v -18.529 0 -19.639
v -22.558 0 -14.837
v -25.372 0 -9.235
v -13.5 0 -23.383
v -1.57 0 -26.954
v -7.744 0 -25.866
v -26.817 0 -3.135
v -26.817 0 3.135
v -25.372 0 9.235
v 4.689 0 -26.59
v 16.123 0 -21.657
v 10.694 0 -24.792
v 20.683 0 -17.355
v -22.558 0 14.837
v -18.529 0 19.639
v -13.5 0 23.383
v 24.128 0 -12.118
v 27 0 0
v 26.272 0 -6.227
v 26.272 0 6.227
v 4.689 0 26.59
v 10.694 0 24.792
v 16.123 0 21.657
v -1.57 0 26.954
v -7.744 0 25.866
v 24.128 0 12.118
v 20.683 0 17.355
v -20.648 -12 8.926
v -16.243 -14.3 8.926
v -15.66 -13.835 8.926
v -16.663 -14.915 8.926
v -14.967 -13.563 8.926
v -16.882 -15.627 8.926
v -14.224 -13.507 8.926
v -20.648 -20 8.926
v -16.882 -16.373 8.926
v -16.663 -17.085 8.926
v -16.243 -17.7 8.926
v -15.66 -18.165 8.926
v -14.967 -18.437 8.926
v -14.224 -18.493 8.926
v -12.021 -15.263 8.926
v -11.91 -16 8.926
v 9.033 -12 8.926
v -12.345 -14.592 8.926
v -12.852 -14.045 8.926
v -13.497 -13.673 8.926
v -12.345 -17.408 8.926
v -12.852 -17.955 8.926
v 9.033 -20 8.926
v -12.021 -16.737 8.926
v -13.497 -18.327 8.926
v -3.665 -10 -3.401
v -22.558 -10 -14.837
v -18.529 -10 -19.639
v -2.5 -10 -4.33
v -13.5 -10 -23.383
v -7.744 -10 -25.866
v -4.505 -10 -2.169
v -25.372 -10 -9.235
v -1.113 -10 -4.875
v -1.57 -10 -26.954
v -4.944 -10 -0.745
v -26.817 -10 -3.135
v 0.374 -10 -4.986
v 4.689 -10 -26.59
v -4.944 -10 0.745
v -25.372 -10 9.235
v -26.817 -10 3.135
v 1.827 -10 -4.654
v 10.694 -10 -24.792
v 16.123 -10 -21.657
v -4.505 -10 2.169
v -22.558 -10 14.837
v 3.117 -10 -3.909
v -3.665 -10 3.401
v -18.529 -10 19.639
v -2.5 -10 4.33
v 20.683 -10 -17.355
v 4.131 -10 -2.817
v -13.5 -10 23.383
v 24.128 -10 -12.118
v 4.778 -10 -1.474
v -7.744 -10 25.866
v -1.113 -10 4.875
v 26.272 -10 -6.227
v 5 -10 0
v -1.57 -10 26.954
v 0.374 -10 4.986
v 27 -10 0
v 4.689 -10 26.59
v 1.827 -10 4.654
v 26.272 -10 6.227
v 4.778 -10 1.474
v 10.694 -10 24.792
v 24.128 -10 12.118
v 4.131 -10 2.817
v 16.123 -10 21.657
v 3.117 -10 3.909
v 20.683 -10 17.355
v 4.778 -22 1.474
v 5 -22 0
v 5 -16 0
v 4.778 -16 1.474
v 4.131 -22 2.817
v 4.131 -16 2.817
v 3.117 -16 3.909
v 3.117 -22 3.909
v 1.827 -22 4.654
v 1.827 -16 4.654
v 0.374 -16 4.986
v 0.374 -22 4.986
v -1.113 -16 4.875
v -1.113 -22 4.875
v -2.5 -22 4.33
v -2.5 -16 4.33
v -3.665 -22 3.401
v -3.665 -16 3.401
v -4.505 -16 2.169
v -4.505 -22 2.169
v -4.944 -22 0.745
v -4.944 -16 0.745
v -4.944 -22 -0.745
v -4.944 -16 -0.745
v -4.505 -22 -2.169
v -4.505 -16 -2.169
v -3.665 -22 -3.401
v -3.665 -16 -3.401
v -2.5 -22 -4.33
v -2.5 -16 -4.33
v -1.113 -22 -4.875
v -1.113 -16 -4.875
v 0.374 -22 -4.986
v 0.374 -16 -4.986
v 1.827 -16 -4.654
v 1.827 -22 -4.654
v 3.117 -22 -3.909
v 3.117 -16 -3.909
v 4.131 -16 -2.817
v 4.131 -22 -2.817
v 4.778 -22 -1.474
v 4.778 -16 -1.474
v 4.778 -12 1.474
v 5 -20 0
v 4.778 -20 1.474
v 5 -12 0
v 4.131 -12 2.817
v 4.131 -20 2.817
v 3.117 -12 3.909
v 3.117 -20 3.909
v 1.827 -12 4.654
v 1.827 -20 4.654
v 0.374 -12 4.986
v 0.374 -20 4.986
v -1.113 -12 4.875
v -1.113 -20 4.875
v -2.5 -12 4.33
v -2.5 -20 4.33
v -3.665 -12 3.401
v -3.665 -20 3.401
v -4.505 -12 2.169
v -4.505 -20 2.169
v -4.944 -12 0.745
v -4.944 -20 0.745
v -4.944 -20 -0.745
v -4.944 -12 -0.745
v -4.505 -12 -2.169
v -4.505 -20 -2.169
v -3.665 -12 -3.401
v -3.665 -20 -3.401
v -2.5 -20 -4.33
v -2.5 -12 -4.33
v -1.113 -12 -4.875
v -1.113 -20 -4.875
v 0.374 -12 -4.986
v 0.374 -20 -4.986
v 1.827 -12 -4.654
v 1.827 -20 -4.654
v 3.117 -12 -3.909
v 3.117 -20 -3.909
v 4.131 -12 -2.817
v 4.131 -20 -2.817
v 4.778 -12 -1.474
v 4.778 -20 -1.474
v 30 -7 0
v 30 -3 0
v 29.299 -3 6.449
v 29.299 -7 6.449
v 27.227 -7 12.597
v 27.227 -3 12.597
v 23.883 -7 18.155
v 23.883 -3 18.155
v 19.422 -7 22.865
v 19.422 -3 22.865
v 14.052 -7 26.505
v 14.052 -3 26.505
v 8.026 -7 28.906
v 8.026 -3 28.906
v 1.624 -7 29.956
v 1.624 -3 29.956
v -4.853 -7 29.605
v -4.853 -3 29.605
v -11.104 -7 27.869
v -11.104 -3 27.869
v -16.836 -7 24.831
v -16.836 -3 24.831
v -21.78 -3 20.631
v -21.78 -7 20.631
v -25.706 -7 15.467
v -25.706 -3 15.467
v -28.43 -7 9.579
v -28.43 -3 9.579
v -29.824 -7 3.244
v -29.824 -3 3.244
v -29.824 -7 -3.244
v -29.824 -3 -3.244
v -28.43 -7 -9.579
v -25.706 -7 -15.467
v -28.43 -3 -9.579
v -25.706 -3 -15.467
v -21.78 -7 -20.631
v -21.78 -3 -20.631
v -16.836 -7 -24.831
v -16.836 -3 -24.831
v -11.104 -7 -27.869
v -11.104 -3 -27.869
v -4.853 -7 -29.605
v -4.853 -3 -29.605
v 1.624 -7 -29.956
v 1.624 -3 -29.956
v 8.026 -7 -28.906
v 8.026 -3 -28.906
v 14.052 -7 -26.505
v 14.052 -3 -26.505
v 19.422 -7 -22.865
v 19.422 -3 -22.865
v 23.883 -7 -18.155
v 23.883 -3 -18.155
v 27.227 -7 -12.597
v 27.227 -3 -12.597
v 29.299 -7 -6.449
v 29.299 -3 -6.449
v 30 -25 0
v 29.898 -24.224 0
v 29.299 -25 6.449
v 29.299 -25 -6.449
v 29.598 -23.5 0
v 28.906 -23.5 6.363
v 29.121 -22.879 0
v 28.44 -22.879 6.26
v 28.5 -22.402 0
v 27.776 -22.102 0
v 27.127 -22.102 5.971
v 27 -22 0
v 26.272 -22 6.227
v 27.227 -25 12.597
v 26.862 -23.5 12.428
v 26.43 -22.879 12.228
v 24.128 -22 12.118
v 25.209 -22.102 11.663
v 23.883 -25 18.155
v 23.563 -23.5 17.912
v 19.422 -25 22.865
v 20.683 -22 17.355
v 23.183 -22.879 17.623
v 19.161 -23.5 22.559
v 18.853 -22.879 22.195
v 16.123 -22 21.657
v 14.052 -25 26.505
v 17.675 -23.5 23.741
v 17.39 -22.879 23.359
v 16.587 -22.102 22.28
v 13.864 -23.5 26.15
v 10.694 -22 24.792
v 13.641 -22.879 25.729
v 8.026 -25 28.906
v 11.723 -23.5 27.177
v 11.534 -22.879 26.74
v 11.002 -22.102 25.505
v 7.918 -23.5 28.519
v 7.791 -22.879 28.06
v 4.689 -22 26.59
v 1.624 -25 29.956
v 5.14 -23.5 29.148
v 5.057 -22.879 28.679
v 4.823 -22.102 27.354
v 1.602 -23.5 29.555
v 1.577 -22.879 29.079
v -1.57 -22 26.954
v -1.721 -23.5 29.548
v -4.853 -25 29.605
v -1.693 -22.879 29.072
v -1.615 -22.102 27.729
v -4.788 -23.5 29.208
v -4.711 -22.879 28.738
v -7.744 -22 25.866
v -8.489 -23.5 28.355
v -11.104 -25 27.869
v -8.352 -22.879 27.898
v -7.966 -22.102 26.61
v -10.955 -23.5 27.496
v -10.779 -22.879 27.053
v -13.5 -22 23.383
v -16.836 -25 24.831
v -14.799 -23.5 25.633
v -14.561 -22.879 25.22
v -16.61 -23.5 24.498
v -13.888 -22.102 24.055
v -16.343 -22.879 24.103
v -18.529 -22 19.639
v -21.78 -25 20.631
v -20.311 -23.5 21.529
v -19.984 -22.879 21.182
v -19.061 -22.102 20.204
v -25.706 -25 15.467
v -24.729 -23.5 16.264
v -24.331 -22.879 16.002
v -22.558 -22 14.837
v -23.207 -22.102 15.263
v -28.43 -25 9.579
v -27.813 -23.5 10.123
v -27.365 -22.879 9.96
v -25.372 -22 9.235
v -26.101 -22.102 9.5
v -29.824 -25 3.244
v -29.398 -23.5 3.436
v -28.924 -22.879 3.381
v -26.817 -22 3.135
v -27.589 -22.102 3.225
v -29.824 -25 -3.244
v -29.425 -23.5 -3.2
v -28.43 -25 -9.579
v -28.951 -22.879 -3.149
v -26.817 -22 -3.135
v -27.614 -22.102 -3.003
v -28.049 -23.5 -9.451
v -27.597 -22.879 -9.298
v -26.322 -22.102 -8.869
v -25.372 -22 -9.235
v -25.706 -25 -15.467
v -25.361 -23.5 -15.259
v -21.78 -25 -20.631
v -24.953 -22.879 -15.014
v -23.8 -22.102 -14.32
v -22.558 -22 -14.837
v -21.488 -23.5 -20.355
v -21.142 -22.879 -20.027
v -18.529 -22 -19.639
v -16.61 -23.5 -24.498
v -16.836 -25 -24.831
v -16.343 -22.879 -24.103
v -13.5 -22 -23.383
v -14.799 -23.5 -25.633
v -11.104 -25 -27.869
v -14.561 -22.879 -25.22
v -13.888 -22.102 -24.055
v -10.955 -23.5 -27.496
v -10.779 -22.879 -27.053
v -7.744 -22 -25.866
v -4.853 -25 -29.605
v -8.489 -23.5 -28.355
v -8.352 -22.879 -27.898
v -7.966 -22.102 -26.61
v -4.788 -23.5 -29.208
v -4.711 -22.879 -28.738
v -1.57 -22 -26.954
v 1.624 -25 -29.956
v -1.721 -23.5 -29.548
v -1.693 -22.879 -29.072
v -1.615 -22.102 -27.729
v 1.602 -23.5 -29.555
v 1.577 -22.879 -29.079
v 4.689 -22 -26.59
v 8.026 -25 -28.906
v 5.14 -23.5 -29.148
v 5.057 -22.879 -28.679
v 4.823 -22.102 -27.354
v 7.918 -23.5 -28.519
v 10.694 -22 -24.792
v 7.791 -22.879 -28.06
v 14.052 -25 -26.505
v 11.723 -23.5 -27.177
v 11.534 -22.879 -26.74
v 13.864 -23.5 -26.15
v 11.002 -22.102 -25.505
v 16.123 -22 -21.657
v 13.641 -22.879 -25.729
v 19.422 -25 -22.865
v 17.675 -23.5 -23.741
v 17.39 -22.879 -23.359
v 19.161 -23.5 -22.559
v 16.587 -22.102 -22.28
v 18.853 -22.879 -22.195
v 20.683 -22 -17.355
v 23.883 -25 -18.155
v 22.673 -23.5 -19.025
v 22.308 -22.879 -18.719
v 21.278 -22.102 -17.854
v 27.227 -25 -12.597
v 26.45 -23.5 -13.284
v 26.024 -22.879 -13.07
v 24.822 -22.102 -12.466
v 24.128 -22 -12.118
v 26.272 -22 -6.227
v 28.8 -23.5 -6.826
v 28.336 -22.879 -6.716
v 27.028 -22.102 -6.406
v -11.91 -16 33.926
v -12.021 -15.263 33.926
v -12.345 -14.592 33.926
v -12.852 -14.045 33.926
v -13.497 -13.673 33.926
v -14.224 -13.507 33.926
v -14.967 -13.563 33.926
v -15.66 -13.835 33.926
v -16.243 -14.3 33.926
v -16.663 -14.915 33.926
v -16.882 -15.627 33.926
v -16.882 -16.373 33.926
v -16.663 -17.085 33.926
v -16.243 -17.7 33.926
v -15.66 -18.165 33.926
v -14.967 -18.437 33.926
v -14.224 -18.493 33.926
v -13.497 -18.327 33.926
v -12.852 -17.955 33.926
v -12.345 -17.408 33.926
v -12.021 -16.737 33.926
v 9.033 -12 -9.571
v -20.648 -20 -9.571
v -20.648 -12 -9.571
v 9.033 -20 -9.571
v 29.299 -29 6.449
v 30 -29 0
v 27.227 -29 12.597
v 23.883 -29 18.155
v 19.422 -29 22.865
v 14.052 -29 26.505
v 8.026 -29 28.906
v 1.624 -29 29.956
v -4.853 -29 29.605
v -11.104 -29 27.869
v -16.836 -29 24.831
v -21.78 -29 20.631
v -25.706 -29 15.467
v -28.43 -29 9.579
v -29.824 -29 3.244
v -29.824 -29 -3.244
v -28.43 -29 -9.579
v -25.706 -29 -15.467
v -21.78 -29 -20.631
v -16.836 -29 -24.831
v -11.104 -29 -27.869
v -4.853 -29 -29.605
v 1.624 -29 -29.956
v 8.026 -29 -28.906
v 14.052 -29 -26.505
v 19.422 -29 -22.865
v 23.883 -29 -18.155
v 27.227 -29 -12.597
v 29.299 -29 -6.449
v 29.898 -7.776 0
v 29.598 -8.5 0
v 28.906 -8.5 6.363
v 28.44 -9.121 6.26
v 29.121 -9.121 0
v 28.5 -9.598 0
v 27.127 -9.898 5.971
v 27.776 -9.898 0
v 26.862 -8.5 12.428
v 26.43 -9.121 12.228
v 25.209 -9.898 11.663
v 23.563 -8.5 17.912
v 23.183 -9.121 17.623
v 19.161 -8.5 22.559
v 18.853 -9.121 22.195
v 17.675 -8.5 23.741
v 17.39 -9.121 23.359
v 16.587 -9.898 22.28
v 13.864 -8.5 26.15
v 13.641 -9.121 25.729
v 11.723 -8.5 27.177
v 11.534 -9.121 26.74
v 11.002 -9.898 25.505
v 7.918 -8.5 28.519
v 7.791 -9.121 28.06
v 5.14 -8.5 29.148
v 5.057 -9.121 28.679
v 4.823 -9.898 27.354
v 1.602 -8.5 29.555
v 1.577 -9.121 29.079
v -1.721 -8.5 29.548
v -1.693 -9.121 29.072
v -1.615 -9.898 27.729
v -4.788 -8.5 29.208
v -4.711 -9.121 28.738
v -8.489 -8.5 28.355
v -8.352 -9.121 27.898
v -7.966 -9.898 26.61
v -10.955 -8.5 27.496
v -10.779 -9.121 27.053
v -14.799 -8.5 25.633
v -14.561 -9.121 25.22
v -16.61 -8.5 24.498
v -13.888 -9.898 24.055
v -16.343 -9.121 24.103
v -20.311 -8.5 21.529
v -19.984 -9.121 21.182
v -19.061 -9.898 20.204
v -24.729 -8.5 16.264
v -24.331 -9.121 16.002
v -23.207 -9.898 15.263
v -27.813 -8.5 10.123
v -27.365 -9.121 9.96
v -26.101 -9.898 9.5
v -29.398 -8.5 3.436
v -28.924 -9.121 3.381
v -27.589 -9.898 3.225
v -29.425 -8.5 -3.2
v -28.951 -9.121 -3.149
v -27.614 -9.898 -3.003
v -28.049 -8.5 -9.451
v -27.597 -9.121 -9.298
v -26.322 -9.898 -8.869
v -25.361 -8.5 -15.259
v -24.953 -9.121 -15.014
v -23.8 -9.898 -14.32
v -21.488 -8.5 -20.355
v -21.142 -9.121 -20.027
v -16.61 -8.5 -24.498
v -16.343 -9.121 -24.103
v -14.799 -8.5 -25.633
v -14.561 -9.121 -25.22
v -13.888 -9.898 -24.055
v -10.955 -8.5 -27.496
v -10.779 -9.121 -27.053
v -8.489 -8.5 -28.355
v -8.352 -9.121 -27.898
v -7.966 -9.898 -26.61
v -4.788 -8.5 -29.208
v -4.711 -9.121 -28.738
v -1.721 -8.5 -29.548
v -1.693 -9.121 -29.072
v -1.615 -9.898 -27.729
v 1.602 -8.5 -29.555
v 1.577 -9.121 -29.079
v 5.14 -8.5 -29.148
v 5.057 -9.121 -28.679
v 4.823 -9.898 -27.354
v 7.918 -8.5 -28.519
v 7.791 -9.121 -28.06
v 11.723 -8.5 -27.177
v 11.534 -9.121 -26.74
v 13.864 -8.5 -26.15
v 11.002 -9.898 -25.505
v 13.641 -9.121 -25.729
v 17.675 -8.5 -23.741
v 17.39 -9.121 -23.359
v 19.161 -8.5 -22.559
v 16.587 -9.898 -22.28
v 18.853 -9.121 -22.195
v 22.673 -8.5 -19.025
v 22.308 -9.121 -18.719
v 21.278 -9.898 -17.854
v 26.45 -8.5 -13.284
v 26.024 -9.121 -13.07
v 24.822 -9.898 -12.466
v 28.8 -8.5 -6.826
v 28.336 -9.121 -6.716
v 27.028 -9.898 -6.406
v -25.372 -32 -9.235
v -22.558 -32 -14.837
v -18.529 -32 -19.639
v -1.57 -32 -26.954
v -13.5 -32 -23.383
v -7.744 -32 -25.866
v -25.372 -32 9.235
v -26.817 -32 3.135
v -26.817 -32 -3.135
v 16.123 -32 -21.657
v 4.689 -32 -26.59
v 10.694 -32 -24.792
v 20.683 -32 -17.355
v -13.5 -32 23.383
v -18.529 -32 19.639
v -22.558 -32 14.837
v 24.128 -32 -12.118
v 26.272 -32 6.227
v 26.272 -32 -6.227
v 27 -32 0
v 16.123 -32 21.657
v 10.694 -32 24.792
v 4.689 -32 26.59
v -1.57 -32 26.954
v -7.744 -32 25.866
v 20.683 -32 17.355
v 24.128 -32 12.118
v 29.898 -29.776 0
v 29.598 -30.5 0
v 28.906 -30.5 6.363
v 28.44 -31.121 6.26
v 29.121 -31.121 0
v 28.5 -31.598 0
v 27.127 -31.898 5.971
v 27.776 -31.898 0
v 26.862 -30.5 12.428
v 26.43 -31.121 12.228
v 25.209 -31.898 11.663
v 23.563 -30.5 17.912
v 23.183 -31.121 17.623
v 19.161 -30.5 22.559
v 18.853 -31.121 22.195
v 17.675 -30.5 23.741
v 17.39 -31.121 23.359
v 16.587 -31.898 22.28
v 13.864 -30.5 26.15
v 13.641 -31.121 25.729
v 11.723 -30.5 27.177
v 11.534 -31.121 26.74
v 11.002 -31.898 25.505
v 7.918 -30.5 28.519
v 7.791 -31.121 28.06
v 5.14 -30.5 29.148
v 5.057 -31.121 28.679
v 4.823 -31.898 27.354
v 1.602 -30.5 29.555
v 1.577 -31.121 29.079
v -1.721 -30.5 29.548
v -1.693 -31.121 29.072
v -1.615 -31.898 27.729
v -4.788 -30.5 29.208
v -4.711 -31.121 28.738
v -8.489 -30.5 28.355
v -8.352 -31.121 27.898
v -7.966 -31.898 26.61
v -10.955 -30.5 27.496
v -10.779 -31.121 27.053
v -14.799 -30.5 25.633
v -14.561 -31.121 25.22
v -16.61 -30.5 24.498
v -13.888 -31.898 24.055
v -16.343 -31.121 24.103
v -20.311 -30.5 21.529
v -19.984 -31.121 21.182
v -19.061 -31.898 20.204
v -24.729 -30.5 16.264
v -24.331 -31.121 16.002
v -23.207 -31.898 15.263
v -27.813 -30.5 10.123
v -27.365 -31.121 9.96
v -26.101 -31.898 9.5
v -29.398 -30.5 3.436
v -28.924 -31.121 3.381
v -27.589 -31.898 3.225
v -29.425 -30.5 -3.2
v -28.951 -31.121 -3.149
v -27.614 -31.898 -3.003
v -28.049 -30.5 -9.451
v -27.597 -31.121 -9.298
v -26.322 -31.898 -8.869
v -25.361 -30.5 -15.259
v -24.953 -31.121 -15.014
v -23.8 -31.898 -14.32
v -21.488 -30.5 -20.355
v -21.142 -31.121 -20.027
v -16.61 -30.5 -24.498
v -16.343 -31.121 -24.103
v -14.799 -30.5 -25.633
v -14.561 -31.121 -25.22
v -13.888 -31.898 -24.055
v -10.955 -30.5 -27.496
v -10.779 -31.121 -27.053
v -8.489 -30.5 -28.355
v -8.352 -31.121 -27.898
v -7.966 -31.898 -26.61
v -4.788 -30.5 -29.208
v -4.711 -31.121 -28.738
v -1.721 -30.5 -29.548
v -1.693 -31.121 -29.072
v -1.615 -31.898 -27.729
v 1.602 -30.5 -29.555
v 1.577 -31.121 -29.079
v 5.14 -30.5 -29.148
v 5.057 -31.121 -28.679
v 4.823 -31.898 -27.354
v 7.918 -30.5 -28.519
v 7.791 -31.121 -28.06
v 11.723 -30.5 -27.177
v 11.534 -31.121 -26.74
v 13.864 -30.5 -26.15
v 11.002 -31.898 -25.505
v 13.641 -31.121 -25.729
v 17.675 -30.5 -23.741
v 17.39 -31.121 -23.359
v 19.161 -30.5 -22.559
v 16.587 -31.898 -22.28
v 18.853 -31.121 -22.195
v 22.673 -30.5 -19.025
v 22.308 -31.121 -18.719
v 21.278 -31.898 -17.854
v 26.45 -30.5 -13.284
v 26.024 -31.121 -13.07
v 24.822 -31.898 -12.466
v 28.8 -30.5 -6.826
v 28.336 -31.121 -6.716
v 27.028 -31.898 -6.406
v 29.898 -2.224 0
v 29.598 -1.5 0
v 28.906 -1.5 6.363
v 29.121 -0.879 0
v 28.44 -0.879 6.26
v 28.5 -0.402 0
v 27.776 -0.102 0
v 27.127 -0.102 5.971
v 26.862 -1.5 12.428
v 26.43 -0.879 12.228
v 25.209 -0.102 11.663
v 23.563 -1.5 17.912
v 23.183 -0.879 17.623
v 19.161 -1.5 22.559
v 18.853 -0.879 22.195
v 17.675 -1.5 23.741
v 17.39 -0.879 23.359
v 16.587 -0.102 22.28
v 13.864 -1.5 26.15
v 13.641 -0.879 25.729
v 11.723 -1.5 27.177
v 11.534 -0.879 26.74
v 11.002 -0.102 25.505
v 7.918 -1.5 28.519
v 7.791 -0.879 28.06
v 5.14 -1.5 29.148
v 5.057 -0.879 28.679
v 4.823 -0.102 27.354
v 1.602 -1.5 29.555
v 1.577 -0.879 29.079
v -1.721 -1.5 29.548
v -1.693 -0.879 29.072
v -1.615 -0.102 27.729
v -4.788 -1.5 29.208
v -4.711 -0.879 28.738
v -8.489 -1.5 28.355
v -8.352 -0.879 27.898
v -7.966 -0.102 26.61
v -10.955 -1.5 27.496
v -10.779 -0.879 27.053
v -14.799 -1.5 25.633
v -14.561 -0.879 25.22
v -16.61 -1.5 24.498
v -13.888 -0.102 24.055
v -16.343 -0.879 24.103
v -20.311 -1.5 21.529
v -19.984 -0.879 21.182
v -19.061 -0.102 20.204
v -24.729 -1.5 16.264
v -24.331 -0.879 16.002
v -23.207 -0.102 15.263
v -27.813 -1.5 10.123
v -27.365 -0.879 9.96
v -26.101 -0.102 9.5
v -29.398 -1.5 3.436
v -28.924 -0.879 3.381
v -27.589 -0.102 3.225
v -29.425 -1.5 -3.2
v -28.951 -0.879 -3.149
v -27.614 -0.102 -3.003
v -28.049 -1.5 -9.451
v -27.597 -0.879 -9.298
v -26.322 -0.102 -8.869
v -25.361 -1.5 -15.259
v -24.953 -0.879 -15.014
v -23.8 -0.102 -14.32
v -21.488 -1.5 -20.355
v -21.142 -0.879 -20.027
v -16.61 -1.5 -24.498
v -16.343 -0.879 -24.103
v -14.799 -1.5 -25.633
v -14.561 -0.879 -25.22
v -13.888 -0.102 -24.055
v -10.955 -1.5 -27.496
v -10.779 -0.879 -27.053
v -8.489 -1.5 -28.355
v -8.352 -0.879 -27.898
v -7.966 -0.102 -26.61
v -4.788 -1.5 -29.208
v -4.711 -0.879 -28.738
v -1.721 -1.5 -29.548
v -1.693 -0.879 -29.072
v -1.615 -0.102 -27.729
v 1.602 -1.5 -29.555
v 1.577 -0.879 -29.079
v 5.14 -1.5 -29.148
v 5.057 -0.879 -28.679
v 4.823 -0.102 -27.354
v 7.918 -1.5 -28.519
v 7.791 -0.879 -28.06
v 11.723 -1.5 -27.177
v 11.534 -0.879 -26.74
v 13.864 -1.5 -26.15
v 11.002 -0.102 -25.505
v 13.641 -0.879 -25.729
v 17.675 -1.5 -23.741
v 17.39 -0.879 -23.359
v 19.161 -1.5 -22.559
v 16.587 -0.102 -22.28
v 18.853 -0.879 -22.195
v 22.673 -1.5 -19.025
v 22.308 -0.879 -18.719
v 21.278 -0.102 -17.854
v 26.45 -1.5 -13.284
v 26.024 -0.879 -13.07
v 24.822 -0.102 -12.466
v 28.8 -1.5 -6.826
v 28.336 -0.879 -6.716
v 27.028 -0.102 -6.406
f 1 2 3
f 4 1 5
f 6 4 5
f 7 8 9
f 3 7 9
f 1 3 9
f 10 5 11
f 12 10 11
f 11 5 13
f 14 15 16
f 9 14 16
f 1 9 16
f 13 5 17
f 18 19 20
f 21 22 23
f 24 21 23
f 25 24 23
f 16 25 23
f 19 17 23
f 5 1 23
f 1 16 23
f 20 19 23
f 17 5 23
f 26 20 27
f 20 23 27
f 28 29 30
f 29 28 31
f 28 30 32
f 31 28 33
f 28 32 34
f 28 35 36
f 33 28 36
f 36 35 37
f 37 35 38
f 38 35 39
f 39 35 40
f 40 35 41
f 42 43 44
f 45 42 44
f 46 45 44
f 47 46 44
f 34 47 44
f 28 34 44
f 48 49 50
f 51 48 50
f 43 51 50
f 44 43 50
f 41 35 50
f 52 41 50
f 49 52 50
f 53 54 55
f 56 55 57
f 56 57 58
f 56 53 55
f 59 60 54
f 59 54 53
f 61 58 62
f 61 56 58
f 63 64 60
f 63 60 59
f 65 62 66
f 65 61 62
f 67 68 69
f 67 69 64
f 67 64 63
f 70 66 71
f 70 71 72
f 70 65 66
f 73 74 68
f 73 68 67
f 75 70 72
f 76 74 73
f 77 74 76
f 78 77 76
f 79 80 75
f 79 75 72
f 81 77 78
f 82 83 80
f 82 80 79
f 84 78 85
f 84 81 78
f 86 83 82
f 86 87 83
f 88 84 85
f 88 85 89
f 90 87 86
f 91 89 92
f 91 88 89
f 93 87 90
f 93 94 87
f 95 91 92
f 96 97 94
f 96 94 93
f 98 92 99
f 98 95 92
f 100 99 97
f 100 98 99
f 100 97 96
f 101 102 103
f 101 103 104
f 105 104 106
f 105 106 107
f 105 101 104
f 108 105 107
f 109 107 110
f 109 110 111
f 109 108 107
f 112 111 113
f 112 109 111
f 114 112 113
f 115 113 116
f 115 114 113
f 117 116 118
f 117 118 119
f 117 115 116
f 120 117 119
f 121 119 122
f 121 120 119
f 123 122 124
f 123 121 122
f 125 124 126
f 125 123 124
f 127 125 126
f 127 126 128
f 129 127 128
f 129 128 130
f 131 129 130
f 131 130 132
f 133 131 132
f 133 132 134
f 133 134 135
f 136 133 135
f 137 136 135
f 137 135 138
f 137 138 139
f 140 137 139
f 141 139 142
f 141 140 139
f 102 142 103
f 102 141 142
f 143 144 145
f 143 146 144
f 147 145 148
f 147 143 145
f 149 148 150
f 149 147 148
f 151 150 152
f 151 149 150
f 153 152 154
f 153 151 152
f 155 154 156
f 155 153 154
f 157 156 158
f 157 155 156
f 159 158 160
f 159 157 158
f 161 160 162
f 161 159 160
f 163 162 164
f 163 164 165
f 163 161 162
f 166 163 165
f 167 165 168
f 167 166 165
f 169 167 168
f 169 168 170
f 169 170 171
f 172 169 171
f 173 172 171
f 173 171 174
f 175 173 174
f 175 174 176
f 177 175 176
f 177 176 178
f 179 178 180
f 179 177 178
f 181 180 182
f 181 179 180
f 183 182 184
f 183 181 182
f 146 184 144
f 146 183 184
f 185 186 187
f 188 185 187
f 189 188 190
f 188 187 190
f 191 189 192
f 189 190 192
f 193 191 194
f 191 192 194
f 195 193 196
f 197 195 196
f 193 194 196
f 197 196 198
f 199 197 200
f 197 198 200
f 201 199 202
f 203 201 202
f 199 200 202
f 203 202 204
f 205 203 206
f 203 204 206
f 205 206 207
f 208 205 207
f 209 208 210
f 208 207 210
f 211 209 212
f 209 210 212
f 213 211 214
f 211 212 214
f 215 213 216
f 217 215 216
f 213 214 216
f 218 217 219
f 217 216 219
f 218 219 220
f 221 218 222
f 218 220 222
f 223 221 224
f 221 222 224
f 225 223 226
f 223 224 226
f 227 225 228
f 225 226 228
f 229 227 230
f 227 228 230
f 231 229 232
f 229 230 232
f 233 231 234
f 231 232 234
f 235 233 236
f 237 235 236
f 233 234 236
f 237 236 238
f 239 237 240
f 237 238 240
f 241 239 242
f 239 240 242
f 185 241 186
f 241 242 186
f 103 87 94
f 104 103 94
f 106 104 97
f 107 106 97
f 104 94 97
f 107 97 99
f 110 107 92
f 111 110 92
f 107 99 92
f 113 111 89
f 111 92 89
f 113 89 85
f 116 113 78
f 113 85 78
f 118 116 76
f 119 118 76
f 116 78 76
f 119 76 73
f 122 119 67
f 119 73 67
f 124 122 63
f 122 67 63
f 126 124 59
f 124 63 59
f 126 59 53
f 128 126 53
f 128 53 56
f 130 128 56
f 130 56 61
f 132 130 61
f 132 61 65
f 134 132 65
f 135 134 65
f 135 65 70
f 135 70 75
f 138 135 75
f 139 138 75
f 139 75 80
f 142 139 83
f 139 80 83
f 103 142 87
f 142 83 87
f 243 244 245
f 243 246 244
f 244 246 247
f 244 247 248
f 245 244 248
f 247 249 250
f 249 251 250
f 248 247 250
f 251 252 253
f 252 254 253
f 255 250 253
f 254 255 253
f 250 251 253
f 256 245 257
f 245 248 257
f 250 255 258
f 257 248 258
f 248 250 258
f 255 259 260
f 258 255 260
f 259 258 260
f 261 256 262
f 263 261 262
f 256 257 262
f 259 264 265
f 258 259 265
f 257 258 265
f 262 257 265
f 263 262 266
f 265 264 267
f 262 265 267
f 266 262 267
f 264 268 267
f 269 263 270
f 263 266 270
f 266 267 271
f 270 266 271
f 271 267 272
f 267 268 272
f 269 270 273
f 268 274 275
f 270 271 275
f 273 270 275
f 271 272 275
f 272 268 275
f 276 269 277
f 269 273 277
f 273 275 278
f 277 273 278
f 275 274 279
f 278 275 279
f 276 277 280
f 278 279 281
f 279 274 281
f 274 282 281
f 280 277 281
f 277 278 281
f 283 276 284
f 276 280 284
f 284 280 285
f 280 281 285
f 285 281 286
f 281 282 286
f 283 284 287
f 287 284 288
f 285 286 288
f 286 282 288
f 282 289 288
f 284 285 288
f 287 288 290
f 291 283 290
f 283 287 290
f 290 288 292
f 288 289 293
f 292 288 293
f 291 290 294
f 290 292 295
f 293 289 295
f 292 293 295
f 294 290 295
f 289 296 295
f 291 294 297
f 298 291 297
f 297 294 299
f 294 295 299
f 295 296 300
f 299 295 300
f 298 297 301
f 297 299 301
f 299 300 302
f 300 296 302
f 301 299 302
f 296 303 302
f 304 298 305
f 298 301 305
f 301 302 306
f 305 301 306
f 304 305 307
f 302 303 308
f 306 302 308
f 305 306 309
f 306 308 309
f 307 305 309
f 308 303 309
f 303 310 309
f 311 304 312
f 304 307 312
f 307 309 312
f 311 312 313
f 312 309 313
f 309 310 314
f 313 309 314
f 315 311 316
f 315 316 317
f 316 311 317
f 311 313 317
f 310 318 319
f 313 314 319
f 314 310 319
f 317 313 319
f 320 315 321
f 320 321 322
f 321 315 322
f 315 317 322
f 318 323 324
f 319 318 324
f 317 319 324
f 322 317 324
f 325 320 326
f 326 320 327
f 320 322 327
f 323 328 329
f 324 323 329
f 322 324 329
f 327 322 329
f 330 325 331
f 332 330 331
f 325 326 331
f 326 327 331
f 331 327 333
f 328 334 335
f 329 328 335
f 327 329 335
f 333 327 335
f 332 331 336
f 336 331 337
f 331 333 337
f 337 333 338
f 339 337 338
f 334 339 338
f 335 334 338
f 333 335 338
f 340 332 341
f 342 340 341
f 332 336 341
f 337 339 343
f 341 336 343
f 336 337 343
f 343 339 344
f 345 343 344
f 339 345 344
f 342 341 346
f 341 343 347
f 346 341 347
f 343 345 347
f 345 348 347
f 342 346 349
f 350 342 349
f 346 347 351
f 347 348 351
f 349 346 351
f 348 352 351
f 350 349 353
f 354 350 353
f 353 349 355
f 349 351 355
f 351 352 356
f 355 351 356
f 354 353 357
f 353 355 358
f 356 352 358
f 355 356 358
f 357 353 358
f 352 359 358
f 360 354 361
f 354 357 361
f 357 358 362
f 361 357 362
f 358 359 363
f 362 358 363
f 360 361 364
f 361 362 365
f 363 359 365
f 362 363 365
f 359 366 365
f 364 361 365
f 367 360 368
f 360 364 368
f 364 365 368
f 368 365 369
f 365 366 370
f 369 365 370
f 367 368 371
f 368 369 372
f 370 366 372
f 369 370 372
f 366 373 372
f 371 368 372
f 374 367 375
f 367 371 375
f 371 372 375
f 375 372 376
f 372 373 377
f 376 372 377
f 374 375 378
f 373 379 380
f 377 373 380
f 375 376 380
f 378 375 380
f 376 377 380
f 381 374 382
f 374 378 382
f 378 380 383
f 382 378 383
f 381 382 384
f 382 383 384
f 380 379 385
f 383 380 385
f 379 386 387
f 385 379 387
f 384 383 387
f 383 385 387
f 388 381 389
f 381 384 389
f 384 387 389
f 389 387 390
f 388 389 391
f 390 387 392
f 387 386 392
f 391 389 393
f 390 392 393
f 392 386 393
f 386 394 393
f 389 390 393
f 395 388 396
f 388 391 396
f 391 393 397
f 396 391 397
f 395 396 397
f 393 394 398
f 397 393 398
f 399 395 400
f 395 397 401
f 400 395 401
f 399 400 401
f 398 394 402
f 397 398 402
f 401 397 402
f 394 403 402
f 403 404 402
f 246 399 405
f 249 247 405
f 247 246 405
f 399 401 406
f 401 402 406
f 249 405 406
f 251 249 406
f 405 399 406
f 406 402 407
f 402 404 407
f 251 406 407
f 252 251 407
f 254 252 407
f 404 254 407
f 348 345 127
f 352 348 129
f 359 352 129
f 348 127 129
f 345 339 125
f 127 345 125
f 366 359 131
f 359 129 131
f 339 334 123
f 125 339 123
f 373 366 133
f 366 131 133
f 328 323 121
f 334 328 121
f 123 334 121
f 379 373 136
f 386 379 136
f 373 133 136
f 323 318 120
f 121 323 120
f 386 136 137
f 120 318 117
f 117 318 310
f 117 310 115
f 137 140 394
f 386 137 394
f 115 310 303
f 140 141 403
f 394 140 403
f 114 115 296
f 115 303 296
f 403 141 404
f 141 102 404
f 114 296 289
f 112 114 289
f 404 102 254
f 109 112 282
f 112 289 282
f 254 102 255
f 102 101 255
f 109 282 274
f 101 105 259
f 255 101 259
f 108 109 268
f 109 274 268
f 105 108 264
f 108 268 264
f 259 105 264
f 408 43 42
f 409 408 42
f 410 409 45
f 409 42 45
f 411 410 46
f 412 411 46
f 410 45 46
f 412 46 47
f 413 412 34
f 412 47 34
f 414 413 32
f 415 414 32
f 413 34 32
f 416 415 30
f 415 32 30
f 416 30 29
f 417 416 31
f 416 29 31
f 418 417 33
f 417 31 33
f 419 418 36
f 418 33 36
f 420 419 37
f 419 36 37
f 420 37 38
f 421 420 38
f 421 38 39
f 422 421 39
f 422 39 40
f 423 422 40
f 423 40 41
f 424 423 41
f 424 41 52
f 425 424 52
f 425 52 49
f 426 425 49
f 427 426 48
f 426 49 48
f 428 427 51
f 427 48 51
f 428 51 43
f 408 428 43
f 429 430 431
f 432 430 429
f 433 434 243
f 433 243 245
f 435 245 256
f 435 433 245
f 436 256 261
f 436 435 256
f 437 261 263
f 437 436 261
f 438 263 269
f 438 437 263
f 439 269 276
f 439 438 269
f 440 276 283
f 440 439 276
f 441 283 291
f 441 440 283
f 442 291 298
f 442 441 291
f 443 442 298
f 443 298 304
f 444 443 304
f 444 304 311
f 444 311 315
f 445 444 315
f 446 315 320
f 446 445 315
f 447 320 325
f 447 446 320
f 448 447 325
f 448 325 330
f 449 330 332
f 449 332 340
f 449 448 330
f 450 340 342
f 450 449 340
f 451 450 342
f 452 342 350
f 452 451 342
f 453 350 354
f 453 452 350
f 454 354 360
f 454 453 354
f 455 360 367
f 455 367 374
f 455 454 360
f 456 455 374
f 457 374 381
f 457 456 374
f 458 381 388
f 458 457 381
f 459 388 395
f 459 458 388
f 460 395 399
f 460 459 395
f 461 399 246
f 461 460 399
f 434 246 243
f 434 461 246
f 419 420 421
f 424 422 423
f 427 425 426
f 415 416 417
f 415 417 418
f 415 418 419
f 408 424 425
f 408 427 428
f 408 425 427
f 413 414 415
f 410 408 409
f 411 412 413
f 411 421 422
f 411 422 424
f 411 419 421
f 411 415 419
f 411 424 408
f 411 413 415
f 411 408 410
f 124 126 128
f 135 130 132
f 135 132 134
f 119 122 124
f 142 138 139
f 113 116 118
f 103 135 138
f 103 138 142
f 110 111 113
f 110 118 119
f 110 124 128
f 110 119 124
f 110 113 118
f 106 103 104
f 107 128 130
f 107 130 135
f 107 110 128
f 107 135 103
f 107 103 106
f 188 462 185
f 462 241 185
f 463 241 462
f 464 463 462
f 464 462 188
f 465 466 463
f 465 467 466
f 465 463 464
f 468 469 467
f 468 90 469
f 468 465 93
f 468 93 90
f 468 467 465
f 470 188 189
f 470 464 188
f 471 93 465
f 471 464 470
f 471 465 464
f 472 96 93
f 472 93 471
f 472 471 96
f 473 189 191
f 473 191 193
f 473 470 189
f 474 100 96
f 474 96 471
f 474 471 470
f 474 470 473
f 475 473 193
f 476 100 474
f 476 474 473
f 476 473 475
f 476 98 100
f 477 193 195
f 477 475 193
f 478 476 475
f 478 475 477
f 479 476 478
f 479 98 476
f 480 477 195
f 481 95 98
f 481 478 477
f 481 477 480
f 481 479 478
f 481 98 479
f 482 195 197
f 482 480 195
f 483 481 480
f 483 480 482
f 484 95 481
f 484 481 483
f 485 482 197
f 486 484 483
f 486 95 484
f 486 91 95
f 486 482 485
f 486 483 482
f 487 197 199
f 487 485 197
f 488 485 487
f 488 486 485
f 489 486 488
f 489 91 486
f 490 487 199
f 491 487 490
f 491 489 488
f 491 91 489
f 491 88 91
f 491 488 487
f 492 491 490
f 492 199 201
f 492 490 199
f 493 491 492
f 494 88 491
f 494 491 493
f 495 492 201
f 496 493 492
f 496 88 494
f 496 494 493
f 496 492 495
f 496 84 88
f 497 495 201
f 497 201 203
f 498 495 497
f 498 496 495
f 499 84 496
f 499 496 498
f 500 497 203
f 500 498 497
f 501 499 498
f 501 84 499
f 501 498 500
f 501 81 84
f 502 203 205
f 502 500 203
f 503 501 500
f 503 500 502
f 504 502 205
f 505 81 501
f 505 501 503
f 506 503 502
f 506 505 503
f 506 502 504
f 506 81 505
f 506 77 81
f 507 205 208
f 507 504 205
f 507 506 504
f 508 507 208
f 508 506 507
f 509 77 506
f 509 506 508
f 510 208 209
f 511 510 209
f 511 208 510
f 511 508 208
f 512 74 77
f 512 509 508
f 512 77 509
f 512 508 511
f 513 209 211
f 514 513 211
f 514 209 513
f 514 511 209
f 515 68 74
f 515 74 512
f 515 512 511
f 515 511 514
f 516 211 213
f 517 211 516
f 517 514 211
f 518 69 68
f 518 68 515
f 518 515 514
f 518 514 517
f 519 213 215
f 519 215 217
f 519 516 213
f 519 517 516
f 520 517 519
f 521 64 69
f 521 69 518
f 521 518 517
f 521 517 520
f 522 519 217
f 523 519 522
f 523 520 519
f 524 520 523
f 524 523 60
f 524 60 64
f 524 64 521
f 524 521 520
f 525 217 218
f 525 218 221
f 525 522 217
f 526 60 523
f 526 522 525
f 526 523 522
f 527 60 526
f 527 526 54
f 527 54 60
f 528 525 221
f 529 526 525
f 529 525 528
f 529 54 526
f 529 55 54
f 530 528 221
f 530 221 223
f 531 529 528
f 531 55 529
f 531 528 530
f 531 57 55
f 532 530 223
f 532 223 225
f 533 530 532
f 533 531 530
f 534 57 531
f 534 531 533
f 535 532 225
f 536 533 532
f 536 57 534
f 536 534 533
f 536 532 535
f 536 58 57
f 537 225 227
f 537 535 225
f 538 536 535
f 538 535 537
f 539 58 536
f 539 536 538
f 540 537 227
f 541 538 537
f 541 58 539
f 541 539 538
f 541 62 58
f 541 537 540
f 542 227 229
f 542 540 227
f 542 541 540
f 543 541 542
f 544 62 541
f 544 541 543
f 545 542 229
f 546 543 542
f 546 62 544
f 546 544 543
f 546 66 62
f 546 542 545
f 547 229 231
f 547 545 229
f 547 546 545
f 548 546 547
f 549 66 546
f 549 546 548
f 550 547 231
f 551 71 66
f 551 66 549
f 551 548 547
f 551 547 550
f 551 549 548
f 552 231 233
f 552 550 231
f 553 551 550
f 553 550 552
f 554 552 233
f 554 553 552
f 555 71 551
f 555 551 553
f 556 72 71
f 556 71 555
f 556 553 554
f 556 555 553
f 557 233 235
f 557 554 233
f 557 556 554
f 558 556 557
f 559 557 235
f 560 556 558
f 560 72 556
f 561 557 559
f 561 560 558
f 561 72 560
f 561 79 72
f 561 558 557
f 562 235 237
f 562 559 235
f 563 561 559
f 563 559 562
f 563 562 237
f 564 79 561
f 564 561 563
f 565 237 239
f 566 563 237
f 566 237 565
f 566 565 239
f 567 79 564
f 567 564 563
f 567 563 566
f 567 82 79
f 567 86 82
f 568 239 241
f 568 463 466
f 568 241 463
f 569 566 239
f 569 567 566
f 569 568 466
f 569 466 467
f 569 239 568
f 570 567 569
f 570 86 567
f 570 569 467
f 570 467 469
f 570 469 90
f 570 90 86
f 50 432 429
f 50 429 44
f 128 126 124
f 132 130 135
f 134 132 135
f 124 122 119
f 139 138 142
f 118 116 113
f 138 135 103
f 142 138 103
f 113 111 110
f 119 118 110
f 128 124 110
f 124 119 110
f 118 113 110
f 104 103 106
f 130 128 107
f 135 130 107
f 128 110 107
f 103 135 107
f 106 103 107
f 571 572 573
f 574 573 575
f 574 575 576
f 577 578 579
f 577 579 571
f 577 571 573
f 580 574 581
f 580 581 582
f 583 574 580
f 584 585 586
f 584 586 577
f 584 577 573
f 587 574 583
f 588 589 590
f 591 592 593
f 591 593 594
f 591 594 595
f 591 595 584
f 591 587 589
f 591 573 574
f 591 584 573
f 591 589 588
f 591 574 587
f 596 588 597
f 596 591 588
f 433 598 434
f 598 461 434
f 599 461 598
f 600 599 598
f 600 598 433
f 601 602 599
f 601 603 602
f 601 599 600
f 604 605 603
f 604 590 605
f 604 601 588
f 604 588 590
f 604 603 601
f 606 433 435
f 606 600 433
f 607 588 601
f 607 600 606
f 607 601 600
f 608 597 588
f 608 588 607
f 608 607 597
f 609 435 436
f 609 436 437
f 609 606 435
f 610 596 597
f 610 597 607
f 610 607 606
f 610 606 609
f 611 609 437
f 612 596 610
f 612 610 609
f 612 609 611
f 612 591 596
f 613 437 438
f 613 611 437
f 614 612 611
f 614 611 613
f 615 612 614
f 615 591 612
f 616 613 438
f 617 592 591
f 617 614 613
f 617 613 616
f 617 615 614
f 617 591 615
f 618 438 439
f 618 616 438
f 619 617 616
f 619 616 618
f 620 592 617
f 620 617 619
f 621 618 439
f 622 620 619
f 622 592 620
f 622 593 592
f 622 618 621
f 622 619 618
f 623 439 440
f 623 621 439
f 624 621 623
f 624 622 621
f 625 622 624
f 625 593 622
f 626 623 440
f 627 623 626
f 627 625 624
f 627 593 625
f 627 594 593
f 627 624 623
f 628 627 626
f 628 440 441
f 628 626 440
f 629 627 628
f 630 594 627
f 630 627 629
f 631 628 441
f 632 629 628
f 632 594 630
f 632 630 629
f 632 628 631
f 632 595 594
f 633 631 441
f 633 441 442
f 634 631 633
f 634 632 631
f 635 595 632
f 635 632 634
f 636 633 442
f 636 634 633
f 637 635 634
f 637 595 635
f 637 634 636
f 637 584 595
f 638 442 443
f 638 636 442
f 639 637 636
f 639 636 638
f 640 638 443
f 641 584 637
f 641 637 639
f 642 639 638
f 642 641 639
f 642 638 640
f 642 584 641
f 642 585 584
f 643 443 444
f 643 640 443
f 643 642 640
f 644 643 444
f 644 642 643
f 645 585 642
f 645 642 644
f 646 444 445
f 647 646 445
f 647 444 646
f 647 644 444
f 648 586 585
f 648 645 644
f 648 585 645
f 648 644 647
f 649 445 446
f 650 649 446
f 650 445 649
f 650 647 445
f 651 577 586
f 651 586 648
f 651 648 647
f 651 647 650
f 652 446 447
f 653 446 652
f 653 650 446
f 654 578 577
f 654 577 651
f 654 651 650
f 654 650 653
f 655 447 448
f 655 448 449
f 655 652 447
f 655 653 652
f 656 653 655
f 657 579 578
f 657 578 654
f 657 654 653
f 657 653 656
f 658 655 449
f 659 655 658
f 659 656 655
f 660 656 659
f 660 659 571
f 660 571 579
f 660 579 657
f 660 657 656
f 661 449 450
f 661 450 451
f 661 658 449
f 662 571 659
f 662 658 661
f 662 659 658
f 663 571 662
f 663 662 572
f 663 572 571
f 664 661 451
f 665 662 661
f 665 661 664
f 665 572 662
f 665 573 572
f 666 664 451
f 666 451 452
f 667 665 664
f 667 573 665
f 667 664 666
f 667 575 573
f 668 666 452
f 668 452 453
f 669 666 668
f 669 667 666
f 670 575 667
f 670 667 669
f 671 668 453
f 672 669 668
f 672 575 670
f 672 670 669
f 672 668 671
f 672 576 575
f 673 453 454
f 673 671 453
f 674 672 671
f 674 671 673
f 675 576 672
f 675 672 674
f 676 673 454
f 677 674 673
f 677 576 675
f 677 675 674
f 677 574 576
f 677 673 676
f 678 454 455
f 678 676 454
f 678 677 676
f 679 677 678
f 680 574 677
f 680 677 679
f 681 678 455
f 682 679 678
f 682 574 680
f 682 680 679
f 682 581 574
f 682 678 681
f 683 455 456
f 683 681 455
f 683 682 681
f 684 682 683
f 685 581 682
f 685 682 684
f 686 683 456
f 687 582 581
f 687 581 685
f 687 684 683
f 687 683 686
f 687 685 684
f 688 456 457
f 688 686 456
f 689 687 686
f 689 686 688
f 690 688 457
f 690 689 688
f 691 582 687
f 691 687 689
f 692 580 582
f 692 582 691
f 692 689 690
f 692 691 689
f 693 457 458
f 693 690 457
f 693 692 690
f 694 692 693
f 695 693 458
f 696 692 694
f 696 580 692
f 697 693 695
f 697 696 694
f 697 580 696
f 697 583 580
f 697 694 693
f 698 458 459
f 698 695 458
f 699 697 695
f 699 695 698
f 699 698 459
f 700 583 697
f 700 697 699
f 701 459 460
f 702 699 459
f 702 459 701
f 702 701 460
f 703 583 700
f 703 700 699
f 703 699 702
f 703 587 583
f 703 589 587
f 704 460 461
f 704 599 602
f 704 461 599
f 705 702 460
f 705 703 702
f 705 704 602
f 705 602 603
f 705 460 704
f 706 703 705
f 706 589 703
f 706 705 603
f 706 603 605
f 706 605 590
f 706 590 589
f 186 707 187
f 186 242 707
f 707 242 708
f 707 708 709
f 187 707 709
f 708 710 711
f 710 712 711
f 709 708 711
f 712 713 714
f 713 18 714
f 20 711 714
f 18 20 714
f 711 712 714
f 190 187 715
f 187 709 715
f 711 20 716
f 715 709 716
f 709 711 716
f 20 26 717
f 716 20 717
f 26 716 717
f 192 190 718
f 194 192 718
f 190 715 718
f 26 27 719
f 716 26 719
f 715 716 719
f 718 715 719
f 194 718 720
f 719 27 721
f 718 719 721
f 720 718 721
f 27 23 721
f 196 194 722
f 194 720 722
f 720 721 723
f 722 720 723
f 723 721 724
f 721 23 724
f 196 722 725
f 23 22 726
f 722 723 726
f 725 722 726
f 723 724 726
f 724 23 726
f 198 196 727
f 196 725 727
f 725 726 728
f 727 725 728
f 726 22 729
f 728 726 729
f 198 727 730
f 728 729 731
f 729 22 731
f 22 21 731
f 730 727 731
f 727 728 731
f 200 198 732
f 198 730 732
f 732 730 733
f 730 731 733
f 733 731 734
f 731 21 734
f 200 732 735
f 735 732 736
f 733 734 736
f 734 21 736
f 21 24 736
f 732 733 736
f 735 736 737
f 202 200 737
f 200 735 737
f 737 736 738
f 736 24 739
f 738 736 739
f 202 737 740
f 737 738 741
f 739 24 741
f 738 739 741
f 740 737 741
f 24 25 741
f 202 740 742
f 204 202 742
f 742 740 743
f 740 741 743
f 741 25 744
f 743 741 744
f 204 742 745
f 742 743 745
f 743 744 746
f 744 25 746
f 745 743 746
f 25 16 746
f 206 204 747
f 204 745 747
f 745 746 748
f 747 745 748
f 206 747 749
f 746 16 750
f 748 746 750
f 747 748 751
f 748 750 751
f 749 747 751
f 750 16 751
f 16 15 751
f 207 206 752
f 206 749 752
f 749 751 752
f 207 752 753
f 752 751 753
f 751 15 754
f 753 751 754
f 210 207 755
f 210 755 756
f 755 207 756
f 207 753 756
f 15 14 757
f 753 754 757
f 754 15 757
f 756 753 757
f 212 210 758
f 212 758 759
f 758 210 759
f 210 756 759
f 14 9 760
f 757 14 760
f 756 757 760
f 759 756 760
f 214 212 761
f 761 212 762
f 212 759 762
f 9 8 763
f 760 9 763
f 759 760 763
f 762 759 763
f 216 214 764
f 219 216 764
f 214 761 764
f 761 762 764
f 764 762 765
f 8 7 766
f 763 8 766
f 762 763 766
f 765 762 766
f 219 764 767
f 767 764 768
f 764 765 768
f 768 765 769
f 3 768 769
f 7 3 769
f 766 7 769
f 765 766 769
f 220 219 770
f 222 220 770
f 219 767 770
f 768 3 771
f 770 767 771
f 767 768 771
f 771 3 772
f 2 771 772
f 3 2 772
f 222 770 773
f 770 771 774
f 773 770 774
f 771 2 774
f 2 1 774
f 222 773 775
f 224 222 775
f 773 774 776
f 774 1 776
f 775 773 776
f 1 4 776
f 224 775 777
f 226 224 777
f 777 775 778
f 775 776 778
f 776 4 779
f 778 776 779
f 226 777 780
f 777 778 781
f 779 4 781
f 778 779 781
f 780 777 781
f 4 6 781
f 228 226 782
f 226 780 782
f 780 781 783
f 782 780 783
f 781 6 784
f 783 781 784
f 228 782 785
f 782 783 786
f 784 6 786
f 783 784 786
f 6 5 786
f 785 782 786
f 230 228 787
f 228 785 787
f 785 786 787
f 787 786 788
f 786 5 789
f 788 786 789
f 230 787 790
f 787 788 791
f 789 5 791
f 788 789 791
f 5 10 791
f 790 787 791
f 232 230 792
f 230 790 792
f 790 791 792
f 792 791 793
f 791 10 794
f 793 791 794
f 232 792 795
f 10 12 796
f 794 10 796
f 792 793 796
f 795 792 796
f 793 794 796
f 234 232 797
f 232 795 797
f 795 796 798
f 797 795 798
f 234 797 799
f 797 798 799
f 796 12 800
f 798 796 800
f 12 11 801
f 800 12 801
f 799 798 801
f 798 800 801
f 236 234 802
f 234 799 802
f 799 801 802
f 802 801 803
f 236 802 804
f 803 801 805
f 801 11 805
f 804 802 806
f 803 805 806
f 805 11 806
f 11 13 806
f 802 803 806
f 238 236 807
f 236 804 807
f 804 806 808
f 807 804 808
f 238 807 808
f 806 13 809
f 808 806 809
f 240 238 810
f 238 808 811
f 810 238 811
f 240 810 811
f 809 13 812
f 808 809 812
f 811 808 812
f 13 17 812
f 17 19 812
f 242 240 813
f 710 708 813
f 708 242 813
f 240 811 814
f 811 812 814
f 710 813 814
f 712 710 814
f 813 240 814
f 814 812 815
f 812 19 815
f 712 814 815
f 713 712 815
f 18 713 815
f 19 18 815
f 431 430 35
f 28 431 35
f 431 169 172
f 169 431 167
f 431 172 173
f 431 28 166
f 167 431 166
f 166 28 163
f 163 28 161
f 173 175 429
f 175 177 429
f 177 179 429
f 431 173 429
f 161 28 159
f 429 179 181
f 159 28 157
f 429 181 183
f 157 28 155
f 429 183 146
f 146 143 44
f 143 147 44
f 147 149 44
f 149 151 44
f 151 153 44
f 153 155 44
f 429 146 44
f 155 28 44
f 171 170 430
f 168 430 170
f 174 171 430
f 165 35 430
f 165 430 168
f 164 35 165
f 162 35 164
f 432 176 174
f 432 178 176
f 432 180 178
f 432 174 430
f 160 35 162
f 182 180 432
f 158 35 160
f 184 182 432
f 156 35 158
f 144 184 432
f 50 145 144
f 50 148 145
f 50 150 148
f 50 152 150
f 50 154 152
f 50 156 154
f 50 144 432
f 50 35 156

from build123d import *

# Parameters (mm, degrees)
F0_R      = 30
F1_DEPTH  = 10
F2_R      = 3
F3_R      = 3
F4_R      = 5
F5_DEPTH  = 6
F7_W      = 29.68113
F7_H      = 18.496936
F7_R      = 5
F8_DEPTH  = 4
F9_R      = 2.5
F10_DEPTH = 25


with BuildPart() as f1:
    # F0 (on Front) → F1 (new body)
    with BuildSketch(Plane.XZ):
        Circle(F0_R)
    extrude(amount=F1_DEPTH)

    # F2
    f2_edges = [f1.edges().sort_by_distance(p)[0] for p in [
        (-30, -10, 0),
    ]]
    fillet(f2_edges, radius=F2_R)

    # F3
    f3_edges = [f1.edges().sort_by_distance(p)[0] for p in [
        (-30, 0, 0),
    ]]
    fillet(f3_edges, radius=F3_R)

    # F4 (on face) → F5 (join)
    with BuildSketch(Plane.XZ.offset(10)):
        Circle(F4_R)
    extrude(amount=F5_DEPTH)


with BuildPart() as f6_1:
    # F6: instance of F1
    add(f1.part.mirror(Plane.XZ.offset(16)))


with BuildPart() as f8:
    # F7 (on face) → F8 (new body, symmetric)
    with BuildSketch(Plane.XZ.offset(16)):
        with Locations((-5.807177, -0.322621)):
            Rectangle(F7_W, F7_H)
        Circle(F7_R, mode=Mode.SUBTRACT)
    extrude(amount=F8_DEPTH, both=True)

    # F9 (on face) → F10 (join)
    with BuildSketch(Plane.XY.offset(8.925847)):
        with Locations((-14.4104, -16)):
            Circle(F9_R)
    extrude(amount=F10_DEPTH)


solid = Compound([f1.part, f6_1.part, f8.part])
